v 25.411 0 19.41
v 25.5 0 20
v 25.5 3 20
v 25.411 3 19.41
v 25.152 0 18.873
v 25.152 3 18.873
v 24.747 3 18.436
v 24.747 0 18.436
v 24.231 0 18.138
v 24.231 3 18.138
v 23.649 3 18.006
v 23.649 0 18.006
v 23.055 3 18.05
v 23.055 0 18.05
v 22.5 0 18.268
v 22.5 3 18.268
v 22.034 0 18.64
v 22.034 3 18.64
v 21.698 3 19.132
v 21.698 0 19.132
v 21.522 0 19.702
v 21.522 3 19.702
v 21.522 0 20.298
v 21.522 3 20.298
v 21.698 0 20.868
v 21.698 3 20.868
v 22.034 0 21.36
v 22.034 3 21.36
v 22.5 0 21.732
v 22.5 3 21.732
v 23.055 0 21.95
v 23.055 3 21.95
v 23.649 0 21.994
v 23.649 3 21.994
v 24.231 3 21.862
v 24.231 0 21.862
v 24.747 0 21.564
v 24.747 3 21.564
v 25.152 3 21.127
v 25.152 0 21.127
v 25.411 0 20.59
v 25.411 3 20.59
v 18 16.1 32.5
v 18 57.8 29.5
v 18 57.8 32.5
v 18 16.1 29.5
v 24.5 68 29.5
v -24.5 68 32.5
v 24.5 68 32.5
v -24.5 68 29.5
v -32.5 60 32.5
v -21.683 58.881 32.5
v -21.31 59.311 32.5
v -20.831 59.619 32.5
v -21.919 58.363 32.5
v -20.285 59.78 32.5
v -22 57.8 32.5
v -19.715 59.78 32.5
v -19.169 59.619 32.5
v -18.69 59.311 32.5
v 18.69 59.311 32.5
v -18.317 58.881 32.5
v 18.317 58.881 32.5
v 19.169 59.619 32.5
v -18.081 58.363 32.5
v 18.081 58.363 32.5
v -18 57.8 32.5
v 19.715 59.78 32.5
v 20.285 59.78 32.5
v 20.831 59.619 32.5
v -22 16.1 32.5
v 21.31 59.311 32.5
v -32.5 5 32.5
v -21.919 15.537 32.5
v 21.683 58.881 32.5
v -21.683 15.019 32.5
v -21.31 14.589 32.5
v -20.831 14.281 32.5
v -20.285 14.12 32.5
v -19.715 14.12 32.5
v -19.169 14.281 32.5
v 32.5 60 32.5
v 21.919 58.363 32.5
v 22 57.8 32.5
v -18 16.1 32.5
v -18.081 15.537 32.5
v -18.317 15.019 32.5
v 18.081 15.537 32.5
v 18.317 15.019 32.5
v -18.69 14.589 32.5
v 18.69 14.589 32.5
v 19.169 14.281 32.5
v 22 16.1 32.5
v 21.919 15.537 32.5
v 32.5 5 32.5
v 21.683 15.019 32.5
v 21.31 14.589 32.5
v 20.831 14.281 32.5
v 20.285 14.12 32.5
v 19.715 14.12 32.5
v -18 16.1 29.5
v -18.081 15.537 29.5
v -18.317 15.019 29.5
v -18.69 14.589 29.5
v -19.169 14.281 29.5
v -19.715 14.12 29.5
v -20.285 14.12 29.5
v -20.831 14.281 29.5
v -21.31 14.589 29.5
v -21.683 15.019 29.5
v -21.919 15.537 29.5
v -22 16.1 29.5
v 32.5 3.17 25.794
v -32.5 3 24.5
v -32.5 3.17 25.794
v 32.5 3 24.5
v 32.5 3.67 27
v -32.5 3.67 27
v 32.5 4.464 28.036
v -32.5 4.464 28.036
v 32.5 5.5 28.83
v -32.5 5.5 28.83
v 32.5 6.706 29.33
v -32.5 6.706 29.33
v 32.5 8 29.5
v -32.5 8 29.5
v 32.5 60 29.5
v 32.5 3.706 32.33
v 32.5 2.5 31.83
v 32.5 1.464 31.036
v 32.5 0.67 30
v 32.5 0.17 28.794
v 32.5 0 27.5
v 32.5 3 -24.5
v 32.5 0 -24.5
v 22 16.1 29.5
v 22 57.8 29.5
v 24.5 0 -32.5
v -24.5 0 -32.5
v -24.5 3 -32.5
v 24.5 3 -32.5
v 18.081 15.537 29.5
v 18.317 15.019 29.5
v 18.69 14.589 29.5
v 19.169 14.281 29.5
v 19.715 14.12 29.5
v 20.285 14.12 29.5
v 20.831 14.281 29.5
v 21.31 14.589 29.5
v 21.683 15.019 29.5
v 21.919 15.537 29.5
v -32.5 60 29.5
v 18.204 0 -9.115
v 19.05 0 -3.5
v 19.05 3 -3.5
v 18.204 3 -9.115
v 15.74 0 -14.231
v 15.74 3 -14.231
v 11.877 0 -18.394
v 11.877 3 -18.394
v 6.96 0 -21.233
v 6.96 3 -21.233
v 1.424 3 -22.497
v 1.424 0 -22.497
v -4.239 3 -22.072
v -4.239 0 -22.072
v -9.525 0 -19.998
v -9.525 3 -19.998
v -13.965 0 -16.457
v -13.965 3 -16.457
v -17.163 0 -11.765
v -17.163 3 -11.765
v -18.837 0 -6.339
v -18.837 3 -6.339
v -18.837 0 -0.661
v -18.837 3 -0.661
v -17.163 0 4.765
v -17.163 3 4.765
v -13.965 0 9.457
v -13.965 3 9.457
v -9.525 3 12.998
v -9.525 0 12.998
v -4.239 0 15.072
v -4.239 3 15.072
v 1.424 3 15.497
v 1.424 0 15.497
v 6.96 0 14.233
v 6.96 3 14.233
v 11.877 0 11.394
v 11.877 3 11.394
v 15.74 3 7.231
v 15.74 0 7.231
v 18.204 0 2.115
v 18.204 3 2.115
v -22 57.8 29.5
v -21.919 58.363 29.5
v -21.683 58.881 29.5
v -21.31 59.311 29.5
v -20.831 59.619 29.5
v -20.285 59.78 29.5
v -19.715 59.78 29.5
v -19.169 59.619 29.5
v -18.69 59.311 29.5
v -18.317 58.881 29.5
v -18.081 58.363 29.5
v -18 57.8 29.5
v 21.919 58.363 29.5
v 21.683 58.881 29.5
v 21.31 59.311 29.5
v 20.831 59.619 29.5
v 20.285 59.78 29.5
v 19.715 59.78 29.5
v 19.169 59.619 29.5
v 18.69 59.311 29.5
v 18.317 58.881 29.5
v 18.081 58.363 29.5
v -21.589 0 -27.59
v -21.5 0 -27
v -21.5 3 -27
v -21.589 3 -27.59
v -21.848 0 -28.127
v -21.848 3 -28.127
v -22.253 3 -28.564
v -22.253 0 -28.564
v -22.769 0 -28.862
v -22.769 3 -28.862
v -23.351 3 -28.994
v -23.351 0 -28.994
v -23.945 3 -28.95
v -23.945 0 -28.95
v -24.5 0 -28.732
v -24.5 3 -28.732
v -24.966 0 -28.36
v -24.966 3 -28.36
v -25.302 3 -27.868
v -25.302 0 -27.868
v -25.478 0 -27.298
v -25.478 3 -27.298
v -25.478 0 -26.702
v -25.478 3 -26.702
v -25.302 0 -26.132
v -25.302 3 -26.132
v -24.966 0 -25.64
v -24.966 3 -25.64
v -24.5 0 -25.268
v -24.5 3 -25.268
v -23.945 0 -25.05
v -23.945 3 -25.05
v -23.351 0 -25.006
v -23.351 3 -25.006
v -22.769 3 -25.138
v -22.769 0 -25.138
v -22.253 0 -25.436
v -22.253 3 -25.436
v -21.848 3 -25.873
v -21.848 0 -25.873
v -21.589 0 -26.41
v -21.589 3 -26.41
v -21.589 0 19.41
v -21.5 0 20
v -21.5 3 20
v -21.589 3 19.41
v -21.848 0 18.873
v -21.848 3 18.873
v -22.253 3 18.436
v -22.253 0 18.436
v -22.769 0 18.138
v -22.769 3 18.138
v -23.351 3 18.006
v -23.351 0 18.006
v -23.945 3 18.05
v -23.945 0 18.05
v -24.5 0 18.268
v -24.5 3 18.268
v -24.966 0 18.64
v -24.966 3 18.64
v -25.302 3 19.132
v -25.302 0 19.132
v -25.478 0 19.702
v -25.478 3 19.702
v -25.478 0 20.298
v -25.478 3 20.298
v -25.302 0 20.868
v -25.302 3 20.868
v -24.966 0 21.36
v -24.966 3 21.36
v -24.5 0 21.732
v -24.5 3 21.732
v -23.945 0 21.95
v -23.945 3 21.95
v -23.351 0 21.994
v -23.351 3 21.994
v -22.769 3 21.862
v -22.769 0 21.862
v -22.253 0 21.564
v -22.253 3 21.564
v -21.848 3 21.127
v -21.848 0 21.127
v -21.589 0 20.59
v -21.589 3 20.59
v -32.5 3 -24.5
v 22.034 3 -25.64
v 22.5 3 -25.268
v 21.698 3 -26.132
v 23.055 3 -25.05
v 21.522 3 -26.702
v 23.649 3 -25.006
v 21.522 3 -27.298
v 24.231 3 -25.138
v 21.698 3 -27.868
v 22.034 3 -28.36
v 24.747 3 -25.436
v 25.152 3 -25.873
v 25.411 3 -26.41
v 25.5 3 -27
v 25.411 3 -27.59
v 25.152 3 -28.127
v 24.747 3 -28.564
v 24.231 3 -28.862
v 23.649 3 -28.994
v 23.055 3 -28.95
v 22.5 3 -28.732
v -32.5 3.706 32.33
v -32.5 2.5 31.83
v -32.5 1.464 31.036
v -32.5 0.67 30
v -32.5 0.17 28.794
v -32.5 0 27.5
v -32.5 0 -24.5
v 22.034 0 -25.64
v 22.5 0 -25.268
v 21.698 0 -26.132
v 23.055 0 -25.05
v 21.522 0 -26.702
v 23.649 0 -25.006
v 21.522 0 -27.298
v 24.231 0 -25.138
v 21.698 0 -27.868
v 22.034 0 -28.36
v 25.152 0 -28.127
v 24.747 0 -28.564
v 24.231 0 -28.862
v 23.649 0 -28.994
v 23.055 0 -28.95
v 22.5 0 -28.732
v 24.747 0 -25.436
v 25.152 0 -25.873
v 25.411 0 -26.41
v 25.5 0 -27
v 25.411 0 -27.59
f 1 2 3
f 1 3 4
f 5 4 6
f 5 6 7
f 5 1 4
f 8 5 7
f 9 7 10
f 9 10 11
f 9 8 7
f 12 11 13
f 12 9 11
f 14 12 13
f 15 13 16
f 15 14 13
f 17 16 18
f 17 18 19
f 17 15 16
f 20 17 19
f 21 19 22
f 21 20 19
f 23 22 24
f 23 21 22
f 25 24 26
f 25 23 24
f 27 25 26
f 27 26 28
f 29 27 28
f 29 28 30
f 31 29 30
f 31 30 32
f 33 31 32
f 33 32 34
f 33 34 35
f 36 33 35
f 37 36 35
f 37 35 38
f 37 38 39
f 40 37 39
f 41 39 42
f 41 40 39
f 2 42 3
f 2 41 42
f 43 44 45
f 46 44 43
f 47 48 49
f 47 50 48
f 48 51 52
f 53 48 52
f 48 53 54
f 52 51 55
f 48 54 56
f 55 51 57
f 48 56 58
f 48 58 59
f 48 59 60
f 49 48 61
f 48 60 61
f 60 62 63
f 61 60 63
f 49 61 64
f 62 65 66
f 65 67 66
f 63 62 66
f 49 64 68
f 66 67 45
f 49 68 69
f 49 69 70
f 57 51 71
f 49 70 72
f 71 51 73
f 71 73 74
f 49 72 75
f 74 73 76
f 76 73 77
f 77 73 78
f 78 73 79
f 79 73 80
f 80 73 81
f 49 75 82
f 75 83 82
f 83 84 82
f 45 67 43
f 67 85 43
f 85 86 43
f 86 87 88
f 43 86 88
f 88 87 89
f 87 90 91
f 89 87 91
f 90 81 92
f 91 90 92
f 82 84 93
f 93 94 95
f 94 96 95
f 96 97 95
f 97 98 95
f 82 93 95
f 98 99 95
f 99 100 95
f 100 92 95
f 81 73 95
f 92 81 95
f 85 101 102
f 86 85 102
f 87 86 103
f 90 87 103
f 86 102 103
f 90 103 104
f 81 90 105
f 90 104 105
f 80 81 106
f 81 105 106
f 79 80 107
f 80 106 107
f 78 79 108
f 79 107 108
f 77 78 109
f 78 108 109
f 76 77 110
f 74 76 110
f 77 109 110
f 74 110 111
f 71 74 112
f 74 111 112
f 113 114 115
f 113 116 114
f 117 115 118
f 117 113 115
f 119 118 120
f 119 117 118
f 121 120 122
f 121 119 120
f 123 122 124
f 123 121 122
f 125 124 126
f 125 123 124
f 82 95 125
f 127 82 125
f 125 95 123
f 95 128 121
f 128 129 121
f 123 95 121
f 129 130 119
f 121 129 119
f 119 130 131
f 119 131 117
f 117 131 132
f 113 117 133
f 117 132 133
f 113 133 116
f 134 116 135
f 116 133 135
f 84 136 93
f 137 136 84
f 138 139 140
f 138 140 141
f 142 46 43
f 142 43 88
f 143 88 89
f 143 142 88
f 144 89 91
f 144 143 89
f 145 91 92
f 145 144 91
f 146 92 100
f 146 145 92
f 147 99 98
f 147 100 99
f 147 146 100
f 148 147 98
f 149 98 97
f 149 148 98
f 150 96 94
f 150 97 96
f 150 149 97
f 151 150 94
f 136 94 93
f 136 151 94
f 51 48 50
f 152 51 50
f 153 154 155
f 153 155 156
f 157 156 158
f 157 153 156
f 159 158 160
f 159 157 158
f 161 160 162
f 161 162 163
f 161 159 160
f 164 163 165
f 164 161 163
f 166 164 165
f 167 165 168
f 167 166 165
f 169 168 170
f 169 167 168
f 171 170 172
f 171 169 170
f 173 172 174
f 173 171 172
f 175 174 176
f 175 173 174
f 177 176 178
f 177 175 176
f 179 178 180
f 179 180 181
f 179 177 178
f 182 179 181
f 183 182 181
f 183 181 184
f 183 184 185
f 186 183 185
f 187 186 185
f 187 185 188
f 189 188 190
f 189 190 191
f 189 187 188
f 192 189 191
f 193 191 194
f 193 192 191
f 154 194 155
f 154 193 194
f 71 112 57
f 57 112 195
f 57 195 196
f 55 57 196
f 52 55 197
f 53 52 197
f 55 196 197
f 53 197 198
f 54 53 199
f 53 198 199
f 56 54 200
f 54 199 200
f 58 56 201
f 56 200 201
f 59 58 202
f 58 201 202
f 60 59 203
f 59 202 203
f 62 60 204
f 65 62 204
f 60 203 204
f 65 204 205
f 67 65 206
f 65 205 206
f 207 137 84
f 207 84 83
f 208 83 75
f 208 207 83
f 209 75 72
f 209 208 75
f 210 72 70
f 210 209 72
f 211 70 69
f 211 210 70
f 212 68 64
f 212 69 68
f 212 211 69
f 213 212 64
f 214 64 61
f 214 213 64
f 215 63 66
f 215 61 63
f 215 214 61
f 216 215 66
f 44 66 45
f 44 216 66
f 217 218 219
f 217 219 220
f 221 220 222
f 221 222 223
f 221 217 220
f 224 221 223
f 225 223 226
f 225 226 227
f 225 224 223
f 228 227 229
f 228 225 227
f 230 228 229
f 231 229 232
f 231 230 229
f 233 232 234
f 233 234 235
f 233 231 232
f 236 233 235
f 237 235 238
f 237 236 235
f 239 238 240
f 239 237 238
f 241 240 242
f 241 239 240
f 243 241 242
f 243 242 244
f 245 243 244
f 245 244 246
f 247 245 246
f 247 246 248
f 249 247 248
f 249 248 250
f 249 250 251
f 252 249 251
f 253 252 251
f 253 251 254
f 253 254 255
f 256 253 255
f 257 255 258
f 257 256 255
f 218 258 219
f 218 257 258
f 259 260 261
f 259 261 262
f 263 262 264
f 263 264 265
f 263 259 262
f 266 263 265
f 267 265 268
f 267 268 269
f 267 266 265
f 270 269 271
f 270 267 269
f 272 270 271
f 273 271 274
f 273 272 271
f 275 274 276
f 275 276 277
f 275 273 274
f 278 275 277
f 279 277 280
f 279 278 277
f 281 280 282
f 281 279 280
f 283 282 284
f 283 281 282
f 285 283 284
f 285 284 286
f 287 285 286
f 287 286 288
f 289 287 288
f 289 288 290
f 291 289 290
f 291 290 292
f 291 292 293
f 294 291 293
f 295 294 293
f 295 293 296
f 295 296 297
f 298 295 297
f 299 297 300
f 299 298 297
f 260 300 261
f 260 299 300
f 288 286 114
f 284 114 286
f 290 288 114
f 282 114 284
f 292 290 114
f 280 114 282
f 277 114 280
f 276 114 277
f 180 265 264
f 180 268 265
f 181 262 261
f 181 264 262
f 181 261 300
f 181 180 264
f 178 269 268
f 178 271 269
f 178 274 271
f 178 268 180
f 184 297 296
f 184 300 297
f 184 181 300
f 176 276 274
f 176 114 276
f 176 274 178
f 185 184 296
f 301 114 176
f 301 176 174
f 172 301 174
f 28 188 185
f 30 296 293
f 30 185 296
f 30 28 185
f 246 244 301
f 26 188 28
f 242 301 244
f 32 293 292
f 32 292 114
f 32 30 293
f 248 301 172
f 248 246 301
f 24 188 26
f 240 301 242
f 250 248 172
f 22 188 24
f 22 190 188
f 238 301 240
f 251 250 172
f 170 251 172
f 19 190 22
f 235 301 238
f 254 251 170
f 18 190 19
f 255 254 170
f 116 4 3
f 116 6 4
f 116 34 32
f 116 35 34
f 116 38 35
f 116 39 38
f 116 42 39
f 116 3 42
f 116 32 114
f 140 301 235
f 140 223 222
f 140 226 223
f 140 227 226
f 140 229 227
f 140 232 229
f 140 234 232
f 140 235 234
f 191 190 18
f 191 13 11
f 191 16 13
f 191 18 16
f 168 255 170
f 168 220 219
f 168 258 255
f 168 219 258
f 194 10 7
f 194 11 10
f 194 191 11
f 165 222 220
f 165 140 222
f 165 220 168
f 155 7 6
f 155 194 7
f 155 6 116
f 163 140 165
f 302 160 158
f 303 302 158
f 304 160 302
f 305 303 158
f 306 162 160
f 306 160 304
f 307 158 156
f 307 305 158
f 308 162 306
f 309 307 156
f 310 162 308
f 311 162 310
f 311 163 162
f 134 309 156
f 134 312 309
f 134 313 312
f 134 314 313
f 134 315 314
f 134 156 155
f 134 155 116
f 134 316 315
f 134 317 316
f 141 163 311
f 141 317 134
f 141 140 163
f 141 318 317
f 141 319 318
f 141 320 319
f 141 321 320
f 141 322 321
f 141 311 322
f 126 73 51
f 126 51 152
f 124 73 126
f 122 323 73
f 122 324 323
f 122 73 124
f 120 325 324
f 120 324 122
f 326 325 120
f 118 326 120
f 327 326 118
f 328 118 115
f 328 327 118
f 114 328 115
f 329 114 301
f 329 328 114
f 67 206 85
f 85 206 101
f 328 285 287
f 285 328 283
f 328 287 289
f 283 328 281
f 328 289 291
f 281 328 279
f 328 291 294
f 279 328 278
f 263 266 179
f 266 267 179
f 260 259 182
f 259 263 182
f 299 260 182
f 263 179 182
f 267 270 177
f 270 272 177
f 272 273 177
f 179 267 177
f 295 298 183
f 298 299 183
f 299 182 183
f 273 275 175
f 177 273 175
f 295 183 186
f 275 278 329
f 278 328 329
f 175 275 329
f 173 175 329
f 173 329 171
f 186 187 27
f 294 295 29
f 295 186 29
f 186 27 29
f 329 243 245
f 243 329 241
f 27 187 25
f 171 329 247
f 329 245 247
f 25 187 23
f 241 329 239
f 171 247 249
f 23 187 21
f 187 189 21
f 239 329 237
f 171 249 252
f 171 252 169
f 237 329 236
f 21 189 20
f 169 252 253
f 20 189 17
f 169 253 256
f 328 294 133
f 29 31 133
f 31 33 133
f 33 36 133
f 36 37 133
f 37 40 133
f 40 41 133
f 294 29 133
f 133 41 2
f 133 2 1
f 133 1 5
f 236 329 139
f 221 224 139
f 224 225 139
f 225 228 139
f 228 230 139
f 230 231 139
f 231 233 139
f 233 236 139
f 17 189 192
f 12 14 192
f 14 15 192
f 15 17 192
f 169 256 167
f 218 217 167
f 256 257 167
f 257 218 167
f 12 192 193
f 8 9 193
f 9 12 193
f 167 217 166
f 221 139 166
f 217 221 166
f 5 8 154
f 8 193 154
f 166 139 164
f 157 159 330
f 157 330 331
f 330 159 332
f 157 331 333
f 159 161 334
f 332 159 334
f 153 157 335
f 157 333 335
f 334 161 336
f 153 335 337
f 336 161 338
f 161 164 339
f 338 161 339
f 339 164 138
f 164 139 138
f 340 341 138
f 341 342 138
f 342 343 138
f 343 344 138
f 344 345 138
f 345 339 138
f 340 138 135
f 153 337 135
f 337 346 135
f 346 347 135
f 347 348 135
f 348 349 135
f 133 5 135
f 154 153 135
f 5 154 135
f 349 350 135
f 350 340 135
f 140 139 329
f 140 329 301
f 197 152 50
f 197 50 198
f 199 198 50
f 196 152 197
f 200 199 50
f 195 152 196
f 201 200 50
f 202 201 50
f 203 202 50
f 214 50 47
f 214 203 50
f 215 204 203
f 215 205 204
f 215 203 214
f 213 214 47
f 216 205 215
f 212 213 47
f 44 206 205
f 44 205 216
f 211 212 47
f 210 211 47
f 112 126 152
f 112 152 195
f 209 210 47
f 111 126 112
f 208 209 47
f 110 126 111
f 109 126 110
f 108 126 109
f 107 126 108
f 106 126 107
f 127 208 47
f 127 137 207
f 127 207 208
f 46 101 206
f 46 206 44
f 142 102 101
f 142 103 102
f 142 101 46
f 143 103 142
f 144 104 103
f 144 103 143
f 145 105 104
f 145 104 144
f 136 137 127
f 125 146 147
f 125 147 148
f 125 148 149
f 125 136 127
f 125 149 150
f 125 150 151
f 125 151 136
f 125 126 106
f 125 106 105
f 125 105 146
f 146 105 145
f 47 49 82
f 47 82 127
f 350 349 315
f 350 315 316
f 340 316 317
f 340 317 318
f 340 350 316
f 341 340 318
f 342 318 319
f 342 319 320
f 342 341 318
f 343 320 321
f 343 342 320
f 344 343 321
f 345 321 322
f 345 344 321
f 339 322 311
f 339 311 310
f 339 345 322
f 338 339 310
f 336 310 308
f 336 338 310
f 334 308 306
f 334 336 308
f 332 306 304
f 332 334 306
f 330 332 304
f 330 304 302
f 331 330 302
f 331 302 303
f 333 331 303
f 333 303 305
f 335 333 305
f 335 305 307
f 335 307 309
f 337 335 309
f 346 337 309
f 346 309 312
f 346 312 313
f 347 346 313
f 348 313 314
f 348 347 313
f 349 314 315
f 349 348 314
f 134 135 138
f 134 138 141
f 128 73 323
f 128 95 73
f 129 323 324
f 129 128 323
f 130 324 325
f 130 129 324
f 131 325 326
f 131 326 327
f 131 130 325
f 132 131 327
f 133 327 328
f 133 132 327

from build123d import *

# Parameters (mm, degrees)
SKETCH_2_W          = 65
SKETCH_2_H          = 65
SKETCH_2_R          = 19.05
SKETCH_2_R_2        = 2
EXTRUDE_2_DEPTH     = 3
CHAMFER_2_SIZE      = 8
SKETCH_3_W          = 65
SKETCH_3_H          = 3
EXTRUDE_3_DEPTH     = 65
FILLET_1_R          = 5
CHAMFER_3_SIZE      = 8
CUT_EXTRUDE_1_DEPTH = 65


with BuildPart() as part:
    # 草圖2 → 填料-伸長2 (new body)
    with BuildSketch(Plane(origin=(0, 0, 0), x_dir=(1, 0, 0), z_dir=(0, 1, 0))):
        Rectangle(SKETCH_2_W, SKETCH_2_H)
        with Locations((0, 3.5)):
            Circle(SKETCH_2_R, mode=Mode.SUBTRACT)
        with Locations((-23.5, 27)):
            Circle(SKETCH_2_R_2, mode=Mode.SUBTRACT)
        with Locations((-23.5, -20)):
            Circle(SKETCH_2_R_2, mode=Mode.SUBTRACT)
        with Locations((23.5, -20)):
            Circle(SKETCH_2_R_2, mode=Mode.SUBTRACT)
        with Locations((23.5, 27)):
            Circle(SKETCH_2_R_2, mode=Mode.SUBTRACT)
    extrude(amount=EXTRUDE_2_DEPTH)

    # 導角2
    chamfer_2_edges = [part.edges().sort_by_distance(p)[0] for p in [
        (-32.5, 1.5, -32.5),
        (32.5, 1.5, -32.5),
    ]]
    chamfer(chamfer_2_edges, length=CHAMFER_2_SIZE)

    # 草圖3 → 填料-伸長3 (add)
    with BuildSketch(Plane(origin=(0, 3, 0), x_dir=(1, 0, 0), z_dir=(0, 1, 0))):
        with Locations((0, -31)):
            Rectangle(SKETCH_3_W, SKETCH_3_H)
    extrude(amount=EXTRUDE_3_DEPTH)

    # 圓角1
    fillet_1_edges = [part.edges().sort_by_distance(p)[0] for p in [
        (0, 0, 32.5),
        (0, 3, 29.5),
    ]]
    fillet(fillet_1_edges, radius=FILLET_1_R)

    # 導角3
    chamfer_3_edges = [part.edges().sort_by_distance(p)[0] for p in [
        (-32.5, 68, 31),
        (32.5, 68, 31),
    ]]
    chamfer(chamfer_3_edges, length=CHAMFER_3_SIZE)

    # 草圖4 → 除料-伸長1 (cut)
    with BuildSketch(Plane(origin=(0, 0, 29.5), x_dir=(-1, 0, 0), z_dir=(0, 0, -1))):
        with BuildLine():
            Line((-18, 57.8), (-18, 16.1))
            ThreePointArc((-18, 16.1), (-20, 14.1), (-22, 16.1))
            Line((-22, 16.1), (-22, 57.8))
            ThreePointArc((-22, 57.8), (-20, 59.8), (-18, 57.8))
        make_face()
        with BuildLine():
            Line((18, 57.8), (18, 16.1))
            ThreePointArc((18, 16.1), (20, 14.1), (22, 16.1))
            Line((22, 16.1), (22, 57.8))
            ThreePointArc((22, 57.8), (20, 59.8), (18, 57.8))
        make_face()
    extrude(amount=-CUT_EXTRUDE_1_DEPTH, mode=Mode.SUBTRACT)


solid = part.part
